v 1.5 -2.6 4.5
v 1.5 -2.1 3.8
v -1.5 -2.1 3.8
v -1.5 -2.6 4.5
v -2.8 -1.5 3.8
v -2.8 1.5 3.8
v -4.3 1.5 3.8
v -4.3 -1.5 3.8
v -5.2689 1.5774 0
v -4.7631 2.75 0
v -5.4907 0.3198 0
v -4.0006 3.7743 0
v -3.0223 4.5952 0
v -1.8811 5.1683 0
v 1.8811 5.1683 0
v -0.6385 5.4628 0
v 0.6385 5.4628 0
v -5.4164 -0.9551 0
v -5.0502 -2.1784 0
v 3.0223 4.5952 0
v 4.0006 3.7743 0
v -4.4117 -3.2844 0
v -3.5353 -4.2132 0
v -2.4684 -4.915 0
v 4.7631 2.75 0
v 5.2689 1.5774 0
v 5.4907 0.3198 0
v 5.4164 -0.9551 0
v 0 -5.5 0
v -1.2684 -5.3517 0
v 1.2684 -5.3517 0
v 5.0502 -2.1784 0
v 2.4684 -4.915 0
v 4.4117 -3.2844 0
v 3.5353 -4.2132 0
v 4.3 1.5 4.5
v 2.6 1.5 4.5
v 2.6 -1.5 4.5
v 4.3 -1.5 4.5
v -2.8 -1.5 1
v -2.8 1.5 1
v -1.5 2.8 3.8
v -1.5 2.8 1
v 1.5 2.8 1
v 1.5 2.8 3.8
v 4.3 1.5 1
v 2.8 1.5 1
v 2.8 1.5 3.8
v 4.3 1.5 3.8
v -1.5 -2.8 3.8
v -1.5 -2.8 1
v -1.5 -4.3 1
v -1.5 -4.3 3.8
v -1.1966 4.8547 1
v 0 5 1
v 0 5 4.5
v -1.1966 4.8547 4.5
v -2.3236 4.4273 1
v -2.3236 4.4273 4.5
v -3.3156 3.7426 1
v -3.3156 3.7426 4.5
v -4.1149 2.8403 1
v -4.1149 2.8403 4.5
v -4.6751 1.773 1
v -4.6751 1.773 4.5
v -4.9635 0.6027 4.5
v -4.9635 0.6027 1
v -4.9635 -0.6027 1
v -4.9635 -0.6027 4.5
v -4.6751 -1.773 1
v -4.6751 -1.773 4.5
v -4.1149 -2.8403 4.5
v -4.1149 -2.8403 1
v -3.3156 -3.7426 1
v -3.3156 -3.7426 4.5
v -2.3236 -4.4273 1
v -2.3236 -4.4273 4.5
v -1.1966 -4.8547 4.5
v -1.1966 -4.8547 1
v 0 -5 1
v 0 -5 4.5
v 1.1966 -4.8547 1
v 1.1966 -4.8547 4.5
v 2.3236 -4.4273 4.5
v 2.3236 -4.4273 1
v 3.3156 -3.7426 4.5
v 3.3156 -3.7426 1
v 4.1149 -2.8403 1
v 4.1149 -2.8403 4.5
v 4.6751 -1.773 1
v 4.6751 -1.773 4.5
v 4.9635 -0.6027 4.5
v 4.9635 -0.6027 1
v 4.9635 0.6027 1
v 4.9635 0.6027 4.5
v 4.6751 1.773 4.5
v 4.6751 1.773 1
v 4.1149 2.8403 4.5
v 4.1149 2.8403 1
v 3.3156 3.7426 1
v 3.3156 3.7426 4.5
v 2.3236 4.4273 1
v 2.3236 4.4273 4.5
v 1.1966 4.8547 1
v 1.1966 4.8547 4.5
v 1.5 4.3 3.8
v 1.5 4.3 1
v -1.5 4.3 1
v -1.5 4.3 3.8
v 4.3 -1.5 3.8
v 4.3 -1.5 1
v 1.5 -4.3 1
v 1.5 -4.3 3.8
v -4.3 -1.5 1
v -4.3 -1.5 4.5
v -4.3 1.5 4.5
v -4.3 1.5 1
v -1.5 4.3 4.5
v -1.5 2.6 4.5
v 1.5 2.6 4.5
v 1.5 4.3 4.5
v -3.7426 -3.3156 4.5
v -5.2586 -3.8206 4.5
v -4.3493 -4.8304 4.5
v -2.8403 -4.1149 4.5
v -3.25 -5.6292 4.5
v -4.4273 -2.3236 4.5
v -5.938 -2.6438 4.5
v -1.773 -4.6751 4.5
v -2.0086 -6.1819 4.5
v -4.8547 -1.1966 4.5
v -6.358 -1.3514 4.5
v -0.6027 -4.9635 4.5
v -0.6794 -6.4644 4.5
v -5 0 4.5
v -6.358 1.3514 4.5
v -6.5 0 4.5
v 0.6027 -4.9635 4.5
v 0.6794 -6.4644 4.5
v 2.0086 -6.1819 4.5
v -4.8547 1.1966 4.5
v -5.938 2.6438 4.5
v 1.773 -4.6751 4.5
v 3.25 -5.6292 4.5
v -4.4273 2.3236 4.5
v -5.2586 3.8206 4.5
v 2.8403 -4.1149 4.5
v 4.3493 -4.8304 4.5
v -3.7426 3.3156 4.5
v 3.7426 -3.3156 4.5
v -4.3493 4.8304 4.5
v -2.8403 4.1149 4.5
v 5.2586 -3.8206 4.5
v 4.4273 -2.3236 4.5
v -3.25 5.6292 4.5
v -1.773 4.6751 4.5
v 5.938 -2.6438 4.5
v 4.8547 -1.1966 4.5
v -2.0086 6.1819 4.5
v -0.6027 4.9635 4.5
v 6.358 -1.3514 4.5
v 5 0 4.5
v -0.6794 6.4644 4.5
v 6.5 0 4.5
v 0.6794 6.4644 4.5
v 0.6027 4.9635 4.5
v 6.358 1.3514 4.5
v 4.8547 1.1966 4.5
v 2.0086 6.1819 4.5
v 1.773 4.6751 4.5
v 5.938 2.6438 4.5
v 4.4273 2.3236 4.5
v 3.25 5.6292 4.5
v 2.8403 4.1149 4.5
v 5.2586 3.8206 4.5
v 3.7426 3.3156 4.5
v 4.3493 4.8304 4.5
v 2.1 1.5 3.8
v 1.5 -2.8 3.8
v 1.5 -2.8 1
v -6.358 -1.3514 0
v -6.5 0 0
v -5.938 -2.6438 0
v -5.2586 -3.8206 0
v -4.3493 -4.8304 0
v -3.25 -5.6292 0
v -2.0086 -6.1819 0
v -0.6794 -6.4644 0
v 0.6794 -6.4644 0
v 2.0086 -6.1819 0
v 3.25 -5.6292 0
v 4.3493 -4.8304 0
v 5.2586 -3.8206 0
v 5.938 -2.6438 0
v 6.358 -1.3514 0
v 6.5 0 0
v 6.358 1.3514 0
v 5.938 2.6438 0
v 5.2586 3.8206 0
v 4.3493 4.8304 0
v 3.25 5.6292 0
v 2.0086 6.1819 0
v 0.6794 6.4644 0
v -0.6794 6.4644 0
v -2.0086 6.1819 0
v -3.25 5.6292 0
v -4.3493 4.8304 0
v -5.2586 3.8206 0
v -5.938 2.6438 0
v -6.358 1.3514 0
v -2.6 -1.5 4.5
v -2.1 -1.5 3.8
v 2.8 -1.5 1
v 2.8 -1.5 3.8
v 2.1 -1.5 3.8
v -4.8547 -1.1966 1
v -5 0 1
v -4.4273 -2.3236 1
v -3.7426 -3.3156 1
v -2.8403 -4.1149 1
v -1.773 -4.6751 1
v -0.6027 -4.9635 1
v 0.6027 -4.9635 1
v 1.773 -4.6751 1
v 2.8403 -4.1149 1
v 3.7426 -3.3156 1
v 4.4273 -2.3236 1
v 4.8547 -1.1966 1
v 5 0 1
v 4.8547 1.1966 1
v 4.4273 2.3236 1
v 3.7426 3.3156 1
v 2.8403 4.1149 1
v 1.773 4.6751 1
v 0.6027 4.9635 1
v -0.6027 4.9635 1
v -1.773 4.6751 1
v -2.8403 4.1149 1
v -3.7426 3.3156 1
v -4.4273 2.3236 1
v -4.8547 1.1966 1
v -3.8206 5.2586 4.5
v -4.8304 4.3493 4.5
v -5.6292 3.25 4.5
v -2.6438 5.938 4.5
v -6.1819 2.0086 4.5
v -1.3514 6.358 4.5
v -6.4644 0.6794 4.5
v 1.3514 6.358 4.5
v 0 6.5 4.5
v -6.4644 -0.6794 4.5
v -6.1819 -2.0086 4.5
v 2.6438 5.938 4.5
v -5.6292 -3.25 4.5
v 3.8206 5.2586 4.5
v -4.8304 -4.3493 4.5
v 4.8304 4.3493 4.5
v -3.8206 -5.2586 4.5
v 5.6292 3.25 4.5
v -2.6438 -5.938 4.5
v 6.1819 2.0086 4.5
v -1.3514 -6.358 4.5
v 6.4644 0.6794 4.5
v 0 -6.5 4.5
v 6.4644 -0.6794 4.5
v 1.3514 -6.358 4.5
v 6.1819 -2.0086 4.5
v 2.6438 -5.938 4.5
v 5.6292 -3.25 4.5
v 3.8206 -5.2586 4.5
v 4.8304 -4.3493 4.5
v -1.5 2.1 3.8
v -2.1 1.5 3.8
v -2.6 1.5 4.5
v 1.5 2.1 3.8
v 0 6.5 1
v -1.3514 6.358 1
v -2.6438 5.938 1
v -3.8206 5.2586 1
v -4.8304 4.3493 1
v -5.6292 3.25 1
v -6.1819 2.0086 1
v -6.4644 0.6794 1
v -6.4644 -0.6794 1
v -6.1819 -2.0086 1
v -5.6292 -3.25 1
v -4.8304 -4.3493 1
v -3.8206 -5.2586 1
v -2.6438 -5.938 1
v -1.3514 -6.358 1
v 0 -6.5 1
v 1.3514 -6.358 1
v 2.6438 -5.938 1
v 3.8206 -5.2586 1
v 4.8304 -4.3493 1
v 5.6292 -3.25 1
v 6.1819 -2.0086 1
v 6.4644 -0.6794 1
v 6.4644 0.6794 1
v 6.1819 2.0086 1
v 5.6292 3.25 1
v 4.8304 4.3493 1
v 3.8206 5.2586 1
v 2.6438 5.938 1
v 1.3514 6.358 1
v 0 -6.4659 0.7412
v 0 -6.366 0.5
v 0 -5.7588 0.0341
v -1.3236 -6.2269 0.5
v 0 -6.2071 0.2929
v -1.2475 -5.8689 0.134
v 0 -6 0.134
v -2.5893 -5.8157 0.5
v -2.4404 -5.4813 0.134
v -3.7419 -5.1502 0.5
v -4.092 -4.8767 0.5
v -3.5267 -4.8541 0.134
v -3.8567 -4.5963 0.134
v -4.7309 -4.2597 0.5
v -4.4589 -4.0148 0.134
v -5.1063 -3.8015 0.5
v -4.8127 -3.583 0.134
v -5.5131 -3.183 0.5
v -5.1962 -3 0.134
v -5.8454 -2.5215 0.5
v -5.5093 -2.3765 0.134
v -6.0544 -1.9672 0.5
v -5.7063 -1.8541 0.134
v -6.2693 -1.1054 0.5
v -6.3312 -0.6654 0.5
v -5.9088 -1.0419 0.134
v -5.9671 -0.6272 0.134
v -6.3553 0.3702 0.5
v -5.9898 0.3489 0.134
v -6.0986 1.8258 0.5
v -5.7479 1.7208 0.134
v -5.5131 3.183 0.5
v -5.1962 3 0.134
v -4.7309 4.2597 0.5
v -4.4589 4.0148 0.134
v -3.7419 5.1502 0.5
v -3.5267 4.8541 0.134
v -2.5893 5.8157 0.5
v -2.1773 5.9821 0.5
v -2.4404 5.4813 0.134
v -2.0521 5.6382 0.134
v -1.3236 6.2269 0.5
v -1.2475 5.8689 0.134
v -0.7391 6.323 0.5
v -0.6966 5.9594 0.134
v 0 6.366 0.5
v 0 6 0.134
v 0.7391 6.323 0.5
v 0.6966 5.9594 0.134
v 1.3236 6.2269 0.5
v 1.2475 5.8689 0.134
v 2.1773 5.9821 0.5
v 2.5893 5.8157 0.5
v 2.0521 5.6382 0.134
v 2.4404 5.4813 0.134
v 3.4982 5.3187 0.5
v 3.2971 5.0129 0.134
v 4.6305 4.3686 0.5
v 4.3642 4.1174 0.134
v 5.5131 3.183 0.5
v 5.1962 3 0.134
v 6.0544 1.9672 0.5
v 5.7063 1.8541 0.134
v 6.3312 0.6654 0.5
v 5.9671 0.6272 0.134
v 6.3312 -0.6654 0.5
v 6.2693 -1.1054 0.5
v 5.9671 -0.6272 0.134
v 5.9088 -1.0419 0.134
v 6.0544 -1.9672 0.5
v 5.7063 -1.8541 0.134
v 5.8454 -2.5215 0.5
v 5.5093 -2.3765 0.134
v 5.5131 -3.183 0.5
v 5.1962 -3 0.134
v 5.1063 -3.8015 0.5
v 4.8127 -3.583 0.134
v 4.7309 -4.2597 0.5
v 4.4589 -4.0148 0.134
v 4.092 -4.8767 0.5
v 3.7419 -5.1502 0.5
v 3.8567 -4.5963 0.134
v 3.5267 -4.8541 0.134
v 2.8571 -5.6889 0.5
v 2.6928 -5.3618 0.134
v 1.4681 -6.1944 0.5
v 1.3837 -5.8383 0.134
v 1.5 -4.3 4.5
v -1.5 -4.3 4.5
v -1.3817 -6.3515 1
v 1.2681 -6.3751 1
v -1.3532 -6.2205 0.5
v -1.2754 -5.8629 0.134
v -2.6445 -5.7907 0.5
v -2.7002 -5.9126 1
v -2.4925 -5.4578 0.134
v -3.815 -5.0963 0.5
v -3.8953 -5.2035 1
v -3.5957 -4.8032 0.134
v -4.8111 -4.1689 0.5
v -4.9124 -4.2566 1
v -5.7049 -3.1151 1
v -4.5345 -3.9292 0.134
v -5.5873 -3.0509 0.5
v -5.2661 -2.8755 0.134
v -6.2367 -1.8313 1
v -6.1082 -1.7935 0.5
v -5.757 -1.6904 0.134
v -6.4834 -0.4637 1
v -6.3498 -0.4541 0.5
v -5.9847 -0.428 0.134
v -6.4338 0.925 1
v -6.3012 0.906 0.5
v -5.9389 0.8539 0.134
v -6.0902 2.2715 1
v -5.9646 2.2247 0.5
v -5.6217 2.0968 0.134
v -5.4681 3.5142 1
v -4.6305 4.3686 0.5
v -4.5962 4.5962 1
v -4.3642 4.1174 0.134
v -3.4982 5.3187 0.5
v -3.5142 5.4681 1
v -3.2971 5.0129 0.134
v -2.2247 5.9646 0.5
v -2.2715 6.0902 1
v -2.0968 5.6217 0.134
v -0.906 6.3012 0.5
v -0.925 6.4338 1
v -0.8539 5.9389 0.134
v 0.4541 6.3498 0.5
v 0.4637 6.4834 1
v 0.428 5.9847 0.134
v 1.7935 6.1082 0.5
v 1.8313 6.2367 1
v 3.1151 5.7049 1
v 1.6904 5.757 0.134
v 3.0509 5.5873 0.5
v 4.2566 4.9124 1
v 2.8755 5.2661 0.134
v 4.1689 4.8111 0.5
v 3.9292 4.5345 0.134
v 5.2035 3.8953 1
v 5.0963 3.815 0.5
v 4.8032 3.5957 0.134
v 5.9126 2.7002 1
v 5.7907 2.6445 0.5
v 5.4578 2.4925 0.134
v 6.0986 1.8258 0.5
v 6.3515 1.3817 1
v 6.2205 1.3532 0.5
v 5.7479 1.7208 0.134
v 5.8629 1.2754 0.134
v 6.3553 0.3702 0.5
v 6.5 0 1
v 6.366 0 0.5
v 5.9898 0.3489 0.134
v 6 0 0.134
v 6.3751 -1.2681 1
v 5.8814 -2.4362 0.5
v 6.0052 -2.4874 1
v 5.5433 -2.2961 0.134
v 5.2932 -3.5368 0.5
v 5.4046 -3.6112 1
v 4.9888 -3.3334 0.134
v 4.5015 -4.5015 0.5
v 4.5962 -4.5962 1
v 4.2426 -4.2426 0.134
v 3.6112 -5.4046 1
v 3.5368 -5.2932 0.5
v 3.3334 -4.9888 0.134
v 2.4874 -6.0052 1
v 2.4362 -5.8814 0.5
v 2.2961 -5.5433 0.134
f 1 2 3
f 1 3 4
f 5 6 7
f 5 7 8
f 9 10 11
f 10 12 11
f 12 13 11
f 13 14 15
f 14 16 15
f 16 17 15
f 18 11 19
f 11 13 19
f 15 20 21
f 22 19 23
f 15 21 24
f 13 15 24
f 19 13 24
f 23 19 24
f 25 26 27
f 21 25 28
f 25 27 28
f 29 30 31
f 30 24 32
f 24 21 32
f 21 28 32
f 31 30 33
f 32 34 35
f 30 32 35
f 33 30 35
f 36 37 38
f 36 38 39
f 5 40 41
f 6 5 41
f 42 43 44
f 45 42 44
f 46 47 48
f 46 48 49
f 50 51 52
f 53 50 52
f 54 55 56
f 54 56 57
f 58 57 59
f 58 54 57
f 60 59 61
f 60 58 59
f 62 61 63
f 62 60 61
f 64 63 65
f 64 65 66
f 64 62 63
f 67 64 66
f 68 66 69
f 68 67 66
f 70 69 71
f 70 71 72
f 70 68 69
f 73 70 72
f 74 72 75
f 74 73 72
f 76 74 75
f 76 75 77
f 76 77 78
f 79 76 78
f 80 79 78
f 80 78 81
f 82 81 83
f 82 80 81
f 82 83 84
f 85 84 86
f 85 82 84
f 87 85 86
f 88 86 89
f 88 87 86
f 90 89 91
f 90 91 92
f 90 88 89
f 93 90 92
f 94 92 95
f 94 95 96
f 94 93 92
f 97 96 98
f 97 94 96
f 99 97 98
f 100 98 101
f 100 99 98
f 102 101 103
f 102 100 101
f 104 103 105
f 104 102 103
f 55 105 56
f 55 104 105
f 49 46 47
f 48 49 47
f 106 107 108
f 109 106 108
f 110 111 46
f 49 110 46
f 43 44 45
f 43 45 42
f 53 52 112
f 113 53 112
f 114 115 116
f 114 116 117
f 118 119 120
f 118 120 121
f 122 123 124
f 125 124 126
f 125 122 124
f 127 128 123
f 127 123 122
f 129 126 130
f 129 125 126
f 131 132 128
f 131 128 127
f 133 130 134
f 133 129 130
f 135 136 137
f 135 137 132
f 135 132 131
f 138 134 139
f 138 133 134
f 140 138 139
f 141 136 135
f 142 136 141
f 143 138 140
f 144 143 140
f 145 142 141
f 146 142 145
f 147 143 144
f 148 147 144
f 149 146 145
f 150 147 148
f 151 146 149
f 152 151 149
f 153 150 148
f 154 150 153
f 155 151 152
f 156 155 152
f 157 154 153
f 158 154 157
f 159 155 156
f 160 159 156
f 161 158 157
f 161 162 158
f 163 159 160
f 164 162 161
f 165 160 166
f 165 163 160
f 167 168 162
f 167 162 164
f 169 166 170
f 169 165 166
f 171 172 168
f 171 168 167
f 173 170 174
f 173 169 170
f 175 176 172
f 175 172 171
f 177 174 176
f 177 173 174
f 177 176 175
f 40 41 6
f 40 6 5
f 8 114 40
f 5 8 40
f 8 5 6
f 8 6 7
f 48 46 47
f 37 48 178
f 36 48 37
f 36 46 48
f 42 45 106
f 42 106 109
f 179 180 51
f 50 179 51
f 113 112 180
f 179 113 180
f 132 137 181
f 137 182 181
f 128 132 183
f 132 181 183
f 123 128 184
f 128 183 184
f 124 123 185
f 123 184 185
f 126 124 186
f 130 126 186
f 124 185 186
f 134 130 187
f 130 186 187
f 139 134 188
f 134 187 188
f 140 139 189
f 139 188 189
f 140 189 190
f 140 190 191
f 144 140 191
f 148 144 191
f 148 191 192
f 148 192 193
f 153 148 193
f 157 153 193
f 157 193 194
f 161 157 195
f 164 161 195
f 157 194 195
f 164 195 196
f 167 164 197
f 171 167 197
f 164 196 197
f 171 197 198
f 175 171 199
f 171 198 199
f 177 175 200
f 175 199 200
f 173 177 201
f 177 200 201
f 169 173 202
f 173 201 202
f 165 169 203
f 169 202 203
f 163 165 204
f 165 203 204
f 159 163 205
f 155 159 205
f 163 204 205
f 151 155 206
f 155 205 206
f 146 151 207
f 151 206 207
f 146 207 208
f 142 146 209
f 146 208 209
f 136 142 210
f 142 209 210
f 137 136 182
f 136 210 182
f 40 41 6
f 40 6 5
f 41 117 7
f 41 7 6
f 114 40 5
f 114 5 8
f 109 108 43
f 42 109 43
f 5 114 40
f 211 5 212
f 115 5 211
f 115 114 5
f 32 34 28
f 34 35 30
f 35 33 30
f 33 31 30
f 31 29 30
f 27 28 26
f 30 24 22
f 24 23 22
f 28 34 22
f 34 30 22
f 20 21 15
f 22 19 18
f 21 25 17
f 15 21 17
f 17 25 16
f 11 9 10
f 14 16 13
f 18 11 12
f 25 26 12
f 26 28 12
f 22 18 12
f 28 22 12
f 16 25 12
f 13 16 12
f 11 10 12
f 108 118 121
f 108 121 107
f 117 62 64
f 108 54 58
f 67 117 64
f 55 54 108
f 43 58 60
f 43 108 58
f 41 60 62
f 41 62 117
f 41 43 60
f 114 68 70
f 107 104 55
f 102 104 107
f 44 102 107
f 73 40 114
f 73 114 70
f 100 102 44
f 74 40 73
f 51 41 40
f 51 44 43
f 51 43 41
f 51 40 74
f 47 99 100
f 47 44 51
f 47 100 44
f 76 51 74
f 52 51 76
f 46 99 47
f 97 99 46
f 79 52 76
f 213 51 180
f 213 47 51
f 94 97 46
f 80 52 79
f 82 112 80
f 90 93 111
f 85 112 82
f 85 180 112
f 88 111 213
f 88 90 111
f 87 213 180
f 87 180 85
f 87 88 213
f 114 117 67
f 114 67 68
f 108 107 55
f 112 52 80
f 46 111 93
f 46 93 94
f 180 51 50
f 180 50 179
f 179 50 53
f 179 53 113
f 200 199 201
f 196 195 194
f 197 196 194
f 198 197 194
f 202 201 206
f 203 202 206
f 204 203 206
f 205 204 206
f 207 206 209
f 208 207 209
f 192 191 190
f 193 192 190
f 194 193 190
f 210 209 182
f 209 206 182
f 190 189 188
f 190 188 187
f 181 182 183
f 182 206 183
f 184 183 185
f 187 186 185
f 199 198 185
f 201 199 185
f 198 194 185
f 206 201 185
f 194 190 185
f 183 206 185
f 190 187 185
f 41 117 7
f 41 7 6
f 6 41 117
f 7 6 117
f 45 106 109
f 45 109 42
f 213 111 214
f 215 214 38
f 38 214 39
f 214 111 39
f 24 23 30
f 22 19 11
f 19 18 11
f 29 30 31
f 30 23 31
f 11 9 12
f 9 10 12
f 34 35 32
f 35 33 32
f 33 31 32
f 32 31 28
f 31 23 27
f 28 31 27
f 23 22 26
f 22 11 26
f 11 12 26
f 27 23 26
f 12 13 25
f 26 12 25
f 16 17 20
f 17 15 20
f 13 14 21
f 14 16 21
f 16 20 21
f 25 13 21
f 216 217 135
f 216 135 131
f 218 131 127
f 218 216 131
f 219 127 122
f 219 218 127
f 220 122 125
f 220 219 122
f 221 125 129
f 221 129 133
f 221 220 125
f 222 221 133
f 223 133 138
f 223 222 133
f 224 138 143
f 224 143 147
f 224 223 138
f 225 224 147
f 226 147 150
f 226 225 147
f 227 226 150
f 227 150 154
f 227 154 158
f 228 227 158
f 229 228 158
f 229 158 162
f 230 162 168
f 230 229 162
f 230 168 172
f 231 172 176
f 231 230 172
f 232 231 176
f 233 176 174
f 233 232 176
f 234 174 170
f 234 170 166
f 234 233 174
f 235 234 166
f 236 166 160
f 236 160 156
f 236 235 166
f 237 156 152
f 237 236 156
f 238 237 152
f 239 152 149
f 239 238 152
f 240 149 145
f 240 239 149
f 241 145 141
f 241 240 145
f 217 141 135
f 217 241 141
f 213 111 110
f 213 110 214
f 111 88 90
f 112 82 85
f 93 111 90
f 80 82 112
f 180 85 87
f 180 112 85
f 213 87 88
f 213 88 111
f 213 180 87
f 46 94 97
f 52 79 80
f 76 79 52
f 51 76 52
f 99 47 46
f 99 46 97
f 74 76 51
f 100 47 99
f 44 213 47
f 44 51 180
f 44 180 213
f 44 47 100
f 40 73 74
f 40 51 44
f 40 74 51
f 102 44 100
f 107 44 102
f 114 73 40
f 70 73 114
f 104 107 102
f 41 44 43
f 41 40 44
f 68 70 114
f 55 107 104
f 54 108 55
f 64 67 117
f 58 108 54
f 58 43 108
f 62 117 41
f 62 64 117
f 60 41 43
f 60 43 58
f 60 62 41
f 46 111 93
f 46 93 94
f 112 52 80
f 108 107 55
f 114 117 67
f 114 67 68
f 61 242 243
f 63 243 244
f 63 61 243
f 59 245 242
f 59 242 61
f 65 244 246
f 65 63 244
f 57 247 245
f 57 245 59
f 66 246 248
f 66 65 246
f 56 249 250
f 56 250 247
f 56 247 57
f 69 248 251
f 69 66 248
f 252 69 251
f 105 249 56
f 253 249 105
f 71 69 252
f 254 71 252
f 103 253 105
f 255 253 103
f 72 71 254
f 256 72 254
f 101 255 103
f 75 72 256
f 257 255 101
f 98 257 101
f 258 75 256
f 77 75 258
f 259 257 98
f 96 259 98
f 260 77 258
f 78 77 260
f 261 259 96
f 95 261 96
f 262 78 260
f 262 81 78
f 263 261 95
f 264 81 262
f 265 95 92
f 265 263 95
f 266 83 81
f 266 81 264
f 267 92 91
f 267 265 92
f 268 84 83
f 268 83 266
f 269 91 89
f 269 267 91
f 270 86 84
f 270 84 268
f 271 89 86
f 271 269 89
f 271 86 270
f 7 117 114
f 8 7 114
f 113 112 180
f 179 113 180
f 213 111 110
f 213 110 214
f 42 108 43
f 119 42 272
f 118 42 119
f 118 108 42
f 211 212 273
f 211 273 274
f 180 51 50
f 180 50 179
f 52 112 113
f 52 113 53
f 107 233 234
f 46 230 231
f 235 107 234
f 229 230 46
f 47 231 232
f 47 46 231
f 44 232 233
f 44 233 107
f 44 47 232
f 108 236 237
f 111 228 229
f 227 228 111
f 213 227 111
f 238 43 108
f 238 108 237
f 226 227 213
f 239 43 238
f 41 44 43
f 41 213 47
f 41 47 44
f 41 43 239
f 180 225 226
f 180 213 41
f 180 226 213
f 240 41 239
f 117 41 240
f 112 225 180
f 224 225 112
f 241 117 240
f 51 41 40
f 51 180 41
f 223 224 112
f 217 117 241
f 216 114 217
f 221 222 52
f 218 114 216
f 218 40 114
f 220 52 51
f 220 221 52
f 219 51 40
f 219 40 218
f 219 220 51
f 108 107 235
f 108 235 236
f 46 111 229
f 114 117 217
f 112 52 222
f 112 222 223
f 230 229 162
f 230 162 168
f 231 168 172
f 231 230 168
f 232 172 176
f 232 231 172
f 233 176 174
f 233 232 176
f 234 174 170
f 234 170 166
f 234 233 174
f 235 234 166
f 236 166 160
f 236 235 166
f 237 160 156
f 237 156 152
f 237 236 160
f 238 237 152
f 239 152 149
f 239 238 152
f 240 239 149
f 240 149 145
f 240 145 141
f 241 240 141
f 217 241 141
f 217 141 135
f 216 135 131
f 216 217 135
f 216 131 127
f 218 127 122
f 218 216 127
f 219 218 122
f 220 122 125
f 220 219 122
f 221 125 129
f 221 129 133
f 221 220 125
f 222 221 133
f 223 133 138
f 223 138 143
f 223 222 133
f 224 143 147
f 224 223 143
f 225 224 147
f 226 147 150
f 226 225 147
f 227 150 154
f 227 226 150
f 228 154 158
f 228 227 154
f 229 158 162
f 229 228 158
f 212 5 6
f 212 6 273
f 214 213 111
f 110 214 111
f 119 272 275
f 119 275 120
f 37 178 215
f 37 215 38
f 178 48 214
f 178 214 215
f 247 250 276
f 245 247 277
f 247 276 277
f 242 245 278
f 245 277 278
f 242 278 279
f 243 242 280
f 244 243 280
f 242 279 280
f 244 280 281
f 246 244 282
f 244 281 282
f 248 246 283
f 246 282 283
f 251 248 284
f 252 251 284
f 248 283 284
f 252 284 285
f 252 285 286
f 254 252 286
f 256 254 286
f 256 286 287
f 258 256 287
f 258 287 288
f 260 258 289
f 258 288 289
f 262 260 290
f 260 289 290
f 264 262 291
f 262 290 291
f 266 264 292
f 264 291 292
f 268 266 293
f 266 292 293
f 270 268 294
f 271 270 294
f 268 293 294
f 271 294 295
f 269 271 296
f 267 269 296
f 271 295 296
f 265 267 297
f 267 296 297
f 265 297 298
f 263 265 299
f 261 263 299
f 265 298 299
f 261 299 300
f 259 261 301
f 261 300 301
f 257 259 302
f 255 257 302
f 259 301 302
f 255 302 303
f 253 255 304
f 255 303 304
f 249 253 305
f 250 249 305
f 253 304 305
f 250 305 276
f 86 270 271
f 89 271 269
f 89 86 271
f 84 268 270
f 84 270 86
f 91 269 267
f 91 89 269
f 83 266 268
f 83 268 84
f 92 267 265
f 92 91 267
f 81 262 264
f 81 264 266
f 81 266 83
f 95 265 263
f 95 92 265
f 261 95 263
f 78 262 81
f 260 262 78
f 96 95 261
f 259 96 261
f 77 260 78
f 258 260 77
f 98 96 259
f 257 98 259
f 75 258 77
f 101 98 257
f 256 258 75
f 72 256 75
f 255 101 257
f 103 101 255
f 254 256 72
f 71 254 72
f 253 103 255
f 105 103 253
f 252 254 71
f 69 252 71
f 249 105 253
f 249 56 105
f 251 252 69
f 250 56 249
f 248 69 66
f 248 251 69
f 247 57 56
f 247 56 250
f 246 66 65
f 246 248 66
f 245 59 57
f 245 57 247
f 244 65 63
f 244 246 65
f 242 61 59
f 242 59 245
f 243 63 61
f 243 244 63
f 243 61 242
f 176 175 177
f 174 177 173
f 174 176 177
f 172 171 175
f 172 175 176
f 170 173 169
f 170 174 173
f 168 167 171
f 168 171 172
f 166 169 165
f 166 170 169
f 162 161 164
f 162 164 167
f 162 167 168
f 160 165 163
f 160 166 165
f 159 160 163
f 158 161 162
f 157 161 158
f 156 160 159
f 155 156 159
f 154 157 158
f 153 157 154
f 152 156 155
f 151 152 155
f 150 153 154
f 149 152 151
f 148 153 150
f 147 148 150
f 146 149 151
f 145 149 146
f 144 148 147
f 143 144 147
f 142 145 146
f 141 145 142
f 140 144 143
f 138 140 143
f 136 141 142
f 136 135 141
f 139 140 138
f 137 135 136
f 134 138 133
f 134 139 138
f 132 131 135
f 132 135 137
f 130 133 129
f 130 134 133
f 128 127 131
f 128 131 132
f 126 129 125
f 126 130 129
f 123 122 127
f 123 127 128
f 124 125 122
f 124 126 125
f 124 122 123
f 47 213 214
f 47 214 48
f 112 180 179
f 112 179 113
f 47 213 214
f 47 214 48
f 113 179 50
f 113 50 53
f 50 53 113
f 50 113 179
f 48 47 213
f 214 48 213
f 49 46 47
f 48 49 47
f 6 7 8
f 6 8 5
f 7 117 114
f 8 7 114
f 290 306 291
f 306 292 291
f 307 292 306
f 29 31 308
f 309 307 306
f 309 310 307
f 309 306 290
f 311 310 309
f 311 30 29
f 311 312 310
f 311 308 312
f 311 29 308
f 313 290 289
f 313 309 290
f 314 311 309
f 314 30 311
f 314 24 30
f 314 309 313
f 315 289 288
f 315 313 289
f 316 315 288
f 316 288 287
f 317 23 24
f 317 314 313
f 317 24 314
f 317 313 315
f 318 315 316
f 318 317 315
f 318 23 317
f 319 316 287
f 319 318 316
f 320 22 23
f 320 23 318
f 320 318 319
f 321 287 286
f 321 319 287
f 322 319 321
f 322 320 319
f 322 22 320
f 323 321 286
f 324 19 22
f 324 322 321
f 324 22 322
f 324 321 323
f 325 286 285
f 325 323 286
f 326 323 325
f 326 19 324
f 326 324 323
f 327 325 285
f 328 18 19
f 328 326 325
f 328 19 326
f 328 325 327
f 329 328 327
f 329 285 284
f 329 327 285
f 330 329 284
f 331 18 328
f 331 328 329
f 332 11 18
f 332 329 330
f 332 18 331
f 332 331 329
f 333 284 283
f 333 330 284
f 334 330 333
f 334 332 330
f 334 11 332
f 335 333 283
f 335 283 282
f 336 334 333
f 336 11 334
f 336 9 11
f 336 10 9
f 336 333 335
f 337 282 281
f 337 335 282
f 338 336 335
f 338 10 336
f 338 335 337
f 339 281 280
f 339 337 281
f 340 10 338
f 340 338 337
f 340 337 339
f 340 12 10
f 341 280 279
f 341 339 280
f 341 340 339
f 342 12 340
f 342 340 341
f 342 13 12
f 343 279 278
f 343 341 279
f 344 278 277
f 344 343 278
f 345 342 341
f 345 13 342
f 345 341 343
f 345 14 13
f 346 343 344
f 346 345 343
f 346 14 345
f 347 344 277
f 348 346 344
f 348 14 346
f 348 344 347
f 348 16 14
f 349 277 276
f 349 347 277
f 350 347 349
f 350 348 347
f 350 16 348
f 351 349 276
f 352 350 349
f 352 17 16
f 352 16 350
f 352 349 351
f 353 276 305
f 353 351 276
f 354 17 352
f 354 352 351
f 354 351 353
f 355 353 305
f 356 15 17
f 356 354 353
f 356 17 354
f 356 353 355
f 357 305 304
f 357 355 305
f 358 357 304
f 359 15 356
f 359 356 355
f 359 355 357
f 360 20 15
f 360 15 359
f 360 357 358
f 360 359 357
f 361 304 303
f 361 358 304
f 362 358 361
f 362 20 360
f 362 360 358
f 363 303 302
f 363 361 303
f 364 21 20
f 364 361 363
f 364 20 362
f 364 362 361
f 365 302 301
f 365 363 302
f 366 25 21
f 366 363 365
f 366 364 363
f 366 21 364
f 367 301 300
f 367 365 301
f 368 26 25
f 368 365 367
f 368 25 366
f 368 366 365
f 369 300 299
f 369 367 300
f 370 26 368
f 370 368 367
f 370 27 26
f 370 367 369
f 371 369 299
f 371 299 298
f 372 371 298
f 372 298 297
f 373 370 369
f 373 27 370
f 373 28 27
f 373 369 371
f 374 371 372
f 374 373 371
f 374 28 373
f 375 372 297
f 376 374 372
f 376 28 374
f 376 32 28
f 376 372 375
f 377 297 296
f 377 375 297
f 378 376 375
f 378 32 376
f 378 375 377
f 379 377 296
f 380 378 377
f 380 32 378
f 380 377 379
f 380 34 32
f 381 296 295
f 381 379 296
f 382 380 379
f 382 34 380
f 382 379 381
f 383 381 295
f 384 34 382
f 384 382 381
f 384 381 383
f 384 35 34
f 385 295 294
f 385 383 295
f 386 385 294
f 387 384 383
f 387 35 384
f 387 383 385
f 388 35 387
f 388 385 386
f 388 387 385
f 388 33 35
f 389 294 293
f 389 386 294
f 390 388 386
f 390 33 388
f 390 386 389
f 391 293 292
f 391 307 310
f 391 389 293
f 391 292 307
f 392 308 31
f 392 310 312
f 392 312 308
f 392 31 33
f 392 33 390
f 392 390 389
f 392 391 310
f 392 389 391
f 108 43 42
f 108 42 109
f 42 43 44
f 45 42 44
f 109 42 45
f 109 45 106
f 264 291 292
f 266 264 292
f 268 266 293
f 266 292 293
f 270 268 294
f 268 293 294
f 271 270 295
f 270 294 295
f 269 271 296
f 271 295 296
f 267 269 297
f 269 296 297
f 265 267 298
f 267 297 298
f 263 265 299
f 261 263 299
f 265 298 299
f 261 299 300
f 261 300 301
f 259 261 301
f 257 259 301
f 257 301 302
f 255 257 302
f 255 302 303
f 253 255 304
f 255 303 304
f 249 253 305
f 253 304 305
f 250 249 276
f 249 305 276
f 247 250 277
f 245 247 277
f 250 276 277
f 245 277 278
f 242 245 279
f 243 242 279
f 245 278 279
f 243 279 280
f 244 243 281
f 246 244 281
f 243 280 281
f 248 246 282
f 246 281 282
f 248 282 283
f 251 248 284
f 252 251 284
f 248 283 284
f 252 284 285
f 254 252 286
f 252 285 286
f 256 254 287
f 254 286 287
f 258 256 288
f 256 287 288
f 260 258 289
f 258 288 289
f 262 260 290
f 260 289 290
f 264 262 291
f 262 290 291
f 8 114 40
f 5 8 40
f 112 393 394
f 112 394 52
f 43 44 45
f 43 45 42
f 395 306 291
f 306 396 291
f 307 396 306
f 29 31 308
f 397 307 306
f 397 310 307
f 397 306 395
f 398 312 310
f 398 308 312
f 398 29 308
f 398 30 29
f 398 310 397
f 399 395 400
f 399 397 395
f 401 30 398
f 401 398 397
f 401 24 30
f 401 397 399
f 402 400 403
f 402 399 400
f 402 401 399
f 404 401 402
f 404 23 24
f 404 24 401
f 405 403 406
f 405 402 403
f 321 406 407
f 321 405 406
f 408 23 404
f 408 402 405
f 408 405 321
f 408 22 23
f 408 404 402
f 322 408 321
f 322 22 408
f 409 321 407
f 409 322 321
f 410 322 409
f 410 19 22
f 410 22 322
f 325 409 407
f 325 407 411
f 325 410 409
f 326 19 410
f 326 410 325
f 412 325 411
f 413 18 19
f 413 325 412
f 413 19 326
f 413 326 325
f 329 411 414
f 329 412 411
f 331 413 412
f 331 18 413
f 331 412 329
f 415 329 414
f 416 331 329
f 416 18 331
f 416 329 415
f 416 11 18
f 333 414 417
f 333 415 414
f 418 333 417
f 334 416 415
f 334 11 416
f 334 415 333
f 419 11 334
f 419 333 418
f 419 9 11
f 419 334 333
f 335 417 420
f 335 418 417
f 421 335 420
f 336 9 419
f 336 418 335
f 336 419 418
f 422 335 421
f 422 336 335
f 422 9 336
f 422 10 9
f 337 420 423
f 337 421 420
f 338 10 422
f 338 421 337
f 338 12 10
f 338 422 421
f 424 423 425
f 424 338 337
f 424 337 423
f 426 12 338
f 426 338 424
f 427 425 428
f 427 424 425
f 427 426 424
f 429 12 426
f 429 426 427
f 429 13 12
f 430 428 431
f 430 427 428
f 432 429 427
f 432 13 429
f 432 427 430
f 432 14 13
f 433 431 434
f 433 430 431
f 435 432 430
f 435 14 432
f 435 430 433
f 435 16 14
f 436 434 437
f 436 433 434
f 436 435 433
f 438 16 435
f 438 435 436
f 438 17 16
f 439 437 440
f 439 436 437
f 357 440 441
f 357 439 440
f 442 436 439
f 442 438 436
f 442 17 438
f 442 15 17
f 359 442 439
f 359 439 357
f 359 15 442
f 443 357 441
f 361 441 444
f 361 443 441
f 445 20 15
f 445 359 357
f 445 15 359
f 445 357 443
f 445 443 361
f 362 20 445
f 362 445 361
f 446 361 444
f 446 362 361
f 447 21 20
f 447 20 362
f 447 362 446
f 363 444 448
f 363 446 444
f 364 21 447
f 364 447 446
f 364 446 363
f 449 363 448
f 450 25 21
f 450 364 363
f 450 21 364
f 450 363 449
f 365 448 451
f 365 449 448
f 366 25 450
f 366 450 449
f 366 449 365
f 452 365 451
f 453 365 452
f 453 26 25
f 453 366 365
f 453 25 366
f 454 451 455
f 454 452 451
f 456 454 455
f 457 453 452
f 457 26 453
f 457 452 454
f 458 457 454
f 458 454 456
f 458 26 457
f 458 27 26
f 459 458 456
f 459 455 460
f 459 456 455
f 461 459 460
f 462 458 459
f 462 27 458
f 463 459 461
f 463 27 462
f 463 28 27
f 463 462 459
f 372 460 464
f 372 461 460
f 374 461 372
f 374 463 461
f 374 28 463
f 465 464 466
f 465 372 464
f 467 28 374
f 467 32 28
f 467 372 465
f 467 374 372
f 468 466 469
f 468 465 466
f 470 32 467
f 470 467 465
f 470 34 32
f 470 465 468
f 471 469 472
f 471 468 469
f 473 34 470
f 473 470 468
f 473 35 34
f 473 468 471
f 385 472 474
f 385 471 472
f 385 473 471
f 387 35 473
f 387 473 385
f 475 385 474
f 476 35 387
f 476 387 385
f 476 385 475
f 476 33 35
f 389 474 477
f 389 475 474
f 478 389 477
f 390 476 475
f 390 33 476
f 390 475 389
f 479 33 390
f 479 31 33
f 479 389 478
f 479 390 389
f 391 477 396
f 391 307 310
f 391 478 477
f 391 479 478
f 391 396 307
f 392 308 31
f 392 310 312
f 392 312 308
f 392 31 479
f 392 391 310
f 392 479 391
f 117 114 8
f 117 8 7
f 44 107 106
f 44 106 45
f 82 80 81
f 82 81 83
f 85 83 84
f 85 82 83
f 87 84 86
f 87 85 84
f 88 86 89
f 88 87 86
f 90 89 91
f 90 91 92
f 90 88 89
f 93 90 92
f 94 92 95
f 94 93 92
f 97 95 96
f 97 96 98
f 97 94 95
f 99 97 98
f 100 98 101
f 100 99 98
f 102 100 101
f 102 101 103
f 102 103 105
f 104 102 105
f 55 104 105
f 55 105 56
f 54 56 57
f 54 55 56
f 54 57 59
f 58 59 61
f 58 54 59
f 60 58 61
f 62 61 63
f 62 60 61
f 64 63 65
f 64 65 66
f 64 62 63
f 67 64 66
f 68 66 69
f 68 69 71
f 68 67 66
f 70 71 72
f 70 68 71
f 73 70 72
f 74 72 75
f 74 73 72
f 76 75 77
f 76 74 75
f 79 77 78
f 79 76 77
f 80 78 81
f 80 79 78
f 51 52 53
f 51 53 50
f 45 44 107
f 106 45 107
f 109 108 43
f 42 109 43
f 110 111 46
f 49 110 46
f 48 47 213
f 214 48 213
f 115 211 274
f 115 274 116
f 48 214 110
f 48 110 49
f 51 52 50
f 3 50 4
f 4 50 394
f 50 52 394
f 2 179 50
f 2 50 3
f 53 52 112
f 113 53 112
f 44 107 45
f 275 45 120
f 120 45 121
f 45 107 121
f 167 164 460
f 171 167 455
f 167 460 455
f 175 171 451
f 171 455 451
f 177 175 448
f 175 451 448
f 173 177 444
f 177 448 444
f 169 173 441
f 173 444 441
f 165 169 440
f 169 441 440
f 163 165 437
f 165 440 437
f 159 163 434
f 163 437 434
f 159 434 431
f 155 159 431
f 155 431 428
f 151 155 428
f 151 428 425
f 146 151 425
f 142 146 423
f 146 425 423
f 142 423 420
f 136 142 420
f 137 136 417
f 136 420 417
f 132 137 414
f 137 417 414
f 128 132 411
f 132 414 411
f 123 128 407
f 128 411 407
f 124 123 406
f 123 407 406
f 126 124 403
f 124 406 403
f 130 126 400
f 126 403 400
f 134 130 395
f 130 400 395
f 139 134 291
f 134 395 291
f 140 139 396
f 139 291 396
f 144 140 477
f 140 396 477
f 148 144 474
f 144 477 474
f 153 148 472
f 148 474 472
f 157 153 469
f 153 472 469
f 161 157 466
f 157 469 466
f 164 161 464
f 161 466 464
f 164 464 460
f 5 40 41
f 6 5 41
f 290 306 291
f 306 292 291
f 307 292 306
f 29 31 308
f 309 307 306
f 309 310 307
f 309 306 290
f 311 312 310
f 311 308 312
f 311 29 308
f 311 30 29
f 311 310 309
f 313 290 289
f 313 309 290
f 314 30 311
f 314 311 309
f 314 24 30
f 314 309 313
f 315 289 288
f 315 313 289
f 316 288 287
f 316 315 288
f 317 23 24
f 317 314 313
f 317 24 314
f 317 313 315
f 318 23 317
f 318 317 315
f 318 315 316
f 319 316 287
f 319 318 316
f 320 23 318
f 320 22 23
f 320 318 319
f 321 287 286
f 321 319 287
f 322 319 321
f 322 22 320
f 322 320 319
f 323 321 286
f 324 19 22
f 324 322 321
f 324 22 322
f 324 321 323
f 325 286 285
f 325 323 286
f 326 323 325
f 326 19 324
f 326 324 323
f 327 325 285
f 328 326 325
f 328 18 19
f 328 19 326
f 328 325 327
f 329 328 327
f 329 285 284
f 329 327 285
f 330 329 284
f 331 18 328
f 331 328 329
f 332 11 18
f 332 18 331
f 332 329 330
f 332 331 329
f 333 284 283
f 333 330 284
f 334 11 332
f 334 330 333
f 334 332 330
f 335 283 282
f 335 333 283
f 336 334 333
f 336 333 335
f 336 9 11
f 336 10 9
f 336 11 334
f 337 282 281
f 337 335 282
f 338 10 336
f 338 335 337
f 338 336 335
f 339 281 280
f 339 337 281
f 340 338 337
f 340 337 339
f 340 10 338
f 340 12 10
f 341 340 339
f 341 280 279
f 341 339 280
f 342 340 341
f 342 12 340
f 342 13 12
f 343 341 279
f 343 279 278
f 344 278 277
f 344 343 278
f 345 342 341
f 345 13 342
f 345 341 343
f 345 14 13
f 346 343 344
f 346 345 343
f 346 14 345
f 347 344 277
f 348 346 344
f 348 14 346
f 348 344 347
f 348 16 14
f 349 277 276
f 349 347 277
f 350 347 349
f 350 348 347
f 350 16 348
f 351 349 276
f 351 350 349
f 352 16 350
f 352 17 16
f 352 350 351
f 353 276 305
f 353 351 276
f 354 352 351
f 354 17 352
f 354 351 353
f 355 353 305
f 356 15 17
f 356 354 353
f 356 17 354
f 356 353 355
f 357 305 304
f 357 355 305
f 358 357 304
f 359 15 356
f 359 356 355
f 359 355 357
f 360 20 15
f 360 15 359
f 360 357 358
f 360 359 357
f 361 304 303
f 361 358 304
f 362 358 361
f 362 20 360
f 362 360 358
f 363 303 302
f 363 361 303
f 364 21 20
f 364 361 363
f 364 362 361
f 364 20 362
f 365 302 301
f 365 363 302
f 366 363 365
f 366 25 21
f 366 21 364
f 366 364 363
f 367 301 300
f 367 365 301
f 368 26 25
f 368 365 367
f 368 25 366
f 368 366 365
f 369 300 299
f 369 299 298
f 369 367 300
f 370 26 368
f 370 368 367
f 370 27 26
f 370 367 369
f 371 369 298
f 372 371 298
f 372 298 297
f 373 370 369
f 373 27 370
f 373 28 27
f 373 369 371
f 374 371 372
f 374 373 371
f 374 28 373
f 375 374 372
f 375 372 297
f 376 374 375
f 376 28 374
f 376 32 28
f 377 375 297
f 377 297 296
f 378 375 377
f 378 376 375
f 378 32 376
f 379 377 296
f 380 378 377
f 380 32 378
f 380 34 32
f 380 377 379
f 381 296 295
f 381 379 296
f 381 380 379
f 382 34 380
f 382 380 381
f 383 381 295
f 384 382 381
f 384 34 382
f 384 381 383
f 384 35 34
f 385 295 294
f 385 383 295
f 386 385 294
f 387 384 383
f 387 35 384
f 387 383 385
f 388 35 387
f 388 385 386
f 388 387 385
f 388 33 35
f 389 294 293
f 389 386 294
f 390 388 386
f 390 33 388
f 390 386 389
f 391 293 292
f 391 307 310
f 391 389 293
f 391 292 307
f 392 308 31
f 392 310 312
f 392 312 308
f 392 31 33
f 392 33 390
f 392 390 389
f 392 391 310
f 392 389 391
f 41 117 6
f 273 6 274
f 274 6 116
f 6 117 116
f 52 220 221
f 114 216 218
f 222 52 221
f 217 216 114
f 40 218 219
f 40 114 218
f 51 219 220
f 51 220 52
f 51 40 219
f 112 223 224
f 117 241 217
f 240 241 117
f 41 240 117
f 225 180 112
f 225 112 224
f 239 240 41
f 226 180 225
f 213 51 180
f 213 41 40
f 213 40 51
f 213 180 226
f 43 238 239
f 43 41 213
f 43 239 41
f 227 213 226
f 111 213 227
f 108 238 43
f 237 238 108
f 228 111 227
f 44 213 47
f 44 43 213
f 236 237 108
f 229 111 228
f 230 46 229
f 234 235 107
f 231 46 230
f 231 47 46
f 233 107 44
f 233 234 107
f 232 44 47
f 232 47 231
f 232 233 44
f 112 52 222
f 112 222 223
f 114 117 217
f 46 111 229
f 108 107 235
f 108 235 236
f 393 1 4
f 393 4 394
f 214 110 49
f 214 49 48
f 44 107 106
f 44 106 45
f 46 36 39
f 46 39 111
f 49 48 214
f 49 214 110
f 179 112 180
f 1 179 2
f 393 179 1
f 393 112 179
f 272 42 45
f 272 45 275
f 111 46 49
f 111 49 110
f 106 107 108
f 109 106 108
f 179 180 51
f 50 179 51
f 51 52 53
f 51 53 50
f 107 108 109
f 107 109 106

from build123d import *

# Parameters (mm, degrees)
ESQUISSE1_R                   = 6.5
BOSS_EXTRU_1_DEPTH            = 1
ESQUISSE2_R                   = 6.5
ESQUISSE2_R_2                 = 5
BOSS_EXTRU_2_DEPTH            = 3.5
ESQUISSE3_W                   = 1.5
ESQUISSE3_H                   = 3
ESQUISSE3_W_2                 = 3
ESQUISSE3_H_2                 = 1.5
BOSS_EXTRU_3_DEPTH            = 2.8
BOSS_EXTRU_4_DEPTH            = 3
R_P_TITION_CIRCULAIRE10_COUNT = 4


with BuildPart() as part:
    # Esquisse1 → Boss.-Extru.1 (new body)
    with BuildSketch(Plane.XY):
        Circle(ESQUISSE1_R)
    extrude(amount=BOSS_EXTRU_1_DEPTH)

    # Esquisse2 → Boss.-Extru.2 (add)
    with BuildSketch(Plane.XY.offset(1)):
        Circle(ESQUISSE2_R)
        Circle(ESQUISSE2_R_2, mode=Mode.SUBTRACT)
    extrude(amount=BOSS_EXTRU_2_DEPTH)

    # Esquisse3 → Boss.-Extru.3 (add)
    with BuildSketch(Plane.XY.offset(1)):
        with Locations((3.55, 0)):
            Rectangle(ESQUISSE3_W, ESQUISSE3_H)
        with Locations((0, 3.55)):
            Rectangle(ESQUISSE3_W_2, ESQUISSE3_H_2)
        with Locations((0, -3.55)):
            Rectangle(ESQUISSE3_W_2, ESQUISSE3_H_2)
        with Locations((-3.55, 0)):
            Rectangle(ESQUISSE3_W, ESQUISSE3_H)
    extrude(amount=BOSS_EXTRU_3_DEPTH)

    # Esquisse4 → Boss.-Extru.4 (add)
    with BuildSketch(Plane.ZY.offset(1.5)):
        Polygon((3.8, 4.3), (3.8, 2.1), (4.5, 2.6), (4.5, 4.3), align=None)
    extrude(amount=-BOSS_EXTRU_4_DEPTH)


with BuildPart() as r_p_tition_circulaire10_1:
    # Répétition circulaire10: pattern copy
    add(part.part.rotate(Axis((0, 0, 0), (0, 0, 1)), 1 * 360 / R_P_TITION_CIRCULAIRE10_COUNT))


with BuildPart() as r_p_tition_circulaire10_2:
    # Répétition circulaire10: pattern copy
    add(part.part.rotate(Axis((0, 0, 0), (0, 0, 1)), 2 * 360 / R_P_TITION_CIRCULAIRE10_COUNT))


with BuildPart() as r_p_tition_circulaire10_3:
    # Répétition circulaire10: pattern copy
    add(part.part.rotate(Axis((0, 0, 0), (0, 0, 1)), 3 * 360 / R_P_TITION_CIRCULAIRE10_COUNT))


with BuildPart() as enl_vement_de_mati_re_r_volution1_tool:
    # Esquisse5 → Enlèvement de matière-Révolution1 (revolve)
    with BuildSketch(Plane(origin=(0, 0, 0), x_dir=(0, 0, -1), z_dir=(1, 0, 0))):
        with BuildLine():
            Line((0, -6.5), (-1, -6.5))
            ThreePointArc((-1, -6.5), (-0.292893219, -6.207106781), (0, -5.5))
            Line((0, -5.5), (0, -6.5))
        make_face()
    revolve(axis=Axis((0, 0, 1), (0, 0, -1)))


with BuildPart() as part_1:
    add(part.part)

    # Enlèvement de matière-Révolution1: cut by enl_vement_de_mati_re_r_volution1_tool
    add(enl_vement_de_mati_re_r_volution1_tool.part, mode=Mode.SUBTRACT)


with BuildPart() as r_p_tition_circulaire10_1_1:
    add(r_p_tition_circulaire10_1.part)

    # Enlèvement de matière-Révolution1: cut by enl_vement_de_mati_re_r_volution1_tool
    add(enl_vement_de_mati_re_r_volution1_tool.part, mode=Mode.SUBTRACT)


with BuildPart() as r_p_tition_circulaire10_3_1:
    add(r_p_tition_circulaire10_3.part)

    # Enlèvement de matière-Révolution1: cut by enl_vement_de_mati_re_r_volution1_tool
    add(enl_vement_de_mati_re_r_volution1_tool.part, mode=Mode.SUBTRACT)


solid = Compound([r_p_tition_circulaire10_2.part, part_1.part, r_p_tition_circulaire10_1_1.part, r_p_tition_circulaire10_3_1.part])
